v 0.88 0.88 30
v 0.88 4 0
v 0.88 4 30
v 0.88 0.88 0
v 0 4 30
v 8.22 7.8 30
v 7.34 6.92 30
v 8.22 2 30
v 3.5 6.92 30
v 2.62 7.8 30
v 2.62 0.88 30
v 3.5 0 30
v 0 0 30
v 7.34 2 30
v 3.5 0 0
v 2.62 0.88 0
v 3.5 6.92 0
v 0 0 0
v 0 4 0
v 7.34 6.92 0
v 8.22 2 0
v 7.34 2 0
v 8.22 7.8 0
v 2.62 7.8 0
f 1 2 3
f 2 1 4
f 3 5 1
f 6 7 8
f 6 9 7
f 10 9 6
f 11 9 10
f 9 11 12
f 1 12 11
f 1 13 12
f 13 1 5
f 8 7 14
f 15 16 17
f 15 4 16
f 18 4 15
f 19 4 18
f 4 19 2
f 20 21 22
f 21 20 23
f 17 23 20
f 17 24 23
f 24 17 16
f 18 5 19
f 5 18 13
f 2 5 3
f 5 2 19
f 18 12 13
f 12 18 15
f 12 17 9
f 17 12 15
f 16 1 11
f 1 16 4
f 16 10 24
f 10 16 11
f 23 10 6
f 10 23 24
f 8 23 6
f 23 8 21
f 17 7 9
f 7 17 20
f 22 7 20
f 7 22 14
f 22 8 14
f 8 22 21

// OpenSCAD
/*
 * Vitavia Target Greenhouse Panes Holder 1303
 *
 * Author: Pavel Rampas
 * Version: 1.0.0 (Changelog is at the bottom)
 * License: CC BY-SA 4.0 [https://creativecommons.org/licenses/by-sa/4.0/]
 * Link: https://github.com/pavelrampas/openscad-models
 *
 * OpenSCAD version: 2021.01
 *
 * Instructions:
 * Set up parameters, render and print.
 *
 * Height is layer.
 * Thickness is perimeter.
 */

// Parameters
//------------------------------------------------------------------------------

$fn = $preview ? 15 : 90;

thickness = 0.88;
height = 30;

sizeA = 4;
sizeB = 3.5;
sizeC = 7.8;
sizeD = 5.6;
sizeE = 5.8;

// Code
//------------------------------------------------------------------------------

cube([thickness, sizeA, height]);

cube([sizeB, thickness, height]);

translate([sizeB - thickness, 0, 0]) {
    cube([thickness, sizeC, height]);
}

translate([sizeB - thickness, sizeC - thickness, 0]) {
    cube([sizeD, thickness, height]);
}

translate([(sizeB + sizeD) - (2 * thickness), sizeC - sizeE, 0]) {
    cube([thickness, sizeE, height]);
}

// Functions
//------------------------------------------------------------------------------

// Modules
//------------------------------------------------------------------------------

// Changelog
//------------------------------------------------------------------------------

// [1.0.0]:
// Initial release.
